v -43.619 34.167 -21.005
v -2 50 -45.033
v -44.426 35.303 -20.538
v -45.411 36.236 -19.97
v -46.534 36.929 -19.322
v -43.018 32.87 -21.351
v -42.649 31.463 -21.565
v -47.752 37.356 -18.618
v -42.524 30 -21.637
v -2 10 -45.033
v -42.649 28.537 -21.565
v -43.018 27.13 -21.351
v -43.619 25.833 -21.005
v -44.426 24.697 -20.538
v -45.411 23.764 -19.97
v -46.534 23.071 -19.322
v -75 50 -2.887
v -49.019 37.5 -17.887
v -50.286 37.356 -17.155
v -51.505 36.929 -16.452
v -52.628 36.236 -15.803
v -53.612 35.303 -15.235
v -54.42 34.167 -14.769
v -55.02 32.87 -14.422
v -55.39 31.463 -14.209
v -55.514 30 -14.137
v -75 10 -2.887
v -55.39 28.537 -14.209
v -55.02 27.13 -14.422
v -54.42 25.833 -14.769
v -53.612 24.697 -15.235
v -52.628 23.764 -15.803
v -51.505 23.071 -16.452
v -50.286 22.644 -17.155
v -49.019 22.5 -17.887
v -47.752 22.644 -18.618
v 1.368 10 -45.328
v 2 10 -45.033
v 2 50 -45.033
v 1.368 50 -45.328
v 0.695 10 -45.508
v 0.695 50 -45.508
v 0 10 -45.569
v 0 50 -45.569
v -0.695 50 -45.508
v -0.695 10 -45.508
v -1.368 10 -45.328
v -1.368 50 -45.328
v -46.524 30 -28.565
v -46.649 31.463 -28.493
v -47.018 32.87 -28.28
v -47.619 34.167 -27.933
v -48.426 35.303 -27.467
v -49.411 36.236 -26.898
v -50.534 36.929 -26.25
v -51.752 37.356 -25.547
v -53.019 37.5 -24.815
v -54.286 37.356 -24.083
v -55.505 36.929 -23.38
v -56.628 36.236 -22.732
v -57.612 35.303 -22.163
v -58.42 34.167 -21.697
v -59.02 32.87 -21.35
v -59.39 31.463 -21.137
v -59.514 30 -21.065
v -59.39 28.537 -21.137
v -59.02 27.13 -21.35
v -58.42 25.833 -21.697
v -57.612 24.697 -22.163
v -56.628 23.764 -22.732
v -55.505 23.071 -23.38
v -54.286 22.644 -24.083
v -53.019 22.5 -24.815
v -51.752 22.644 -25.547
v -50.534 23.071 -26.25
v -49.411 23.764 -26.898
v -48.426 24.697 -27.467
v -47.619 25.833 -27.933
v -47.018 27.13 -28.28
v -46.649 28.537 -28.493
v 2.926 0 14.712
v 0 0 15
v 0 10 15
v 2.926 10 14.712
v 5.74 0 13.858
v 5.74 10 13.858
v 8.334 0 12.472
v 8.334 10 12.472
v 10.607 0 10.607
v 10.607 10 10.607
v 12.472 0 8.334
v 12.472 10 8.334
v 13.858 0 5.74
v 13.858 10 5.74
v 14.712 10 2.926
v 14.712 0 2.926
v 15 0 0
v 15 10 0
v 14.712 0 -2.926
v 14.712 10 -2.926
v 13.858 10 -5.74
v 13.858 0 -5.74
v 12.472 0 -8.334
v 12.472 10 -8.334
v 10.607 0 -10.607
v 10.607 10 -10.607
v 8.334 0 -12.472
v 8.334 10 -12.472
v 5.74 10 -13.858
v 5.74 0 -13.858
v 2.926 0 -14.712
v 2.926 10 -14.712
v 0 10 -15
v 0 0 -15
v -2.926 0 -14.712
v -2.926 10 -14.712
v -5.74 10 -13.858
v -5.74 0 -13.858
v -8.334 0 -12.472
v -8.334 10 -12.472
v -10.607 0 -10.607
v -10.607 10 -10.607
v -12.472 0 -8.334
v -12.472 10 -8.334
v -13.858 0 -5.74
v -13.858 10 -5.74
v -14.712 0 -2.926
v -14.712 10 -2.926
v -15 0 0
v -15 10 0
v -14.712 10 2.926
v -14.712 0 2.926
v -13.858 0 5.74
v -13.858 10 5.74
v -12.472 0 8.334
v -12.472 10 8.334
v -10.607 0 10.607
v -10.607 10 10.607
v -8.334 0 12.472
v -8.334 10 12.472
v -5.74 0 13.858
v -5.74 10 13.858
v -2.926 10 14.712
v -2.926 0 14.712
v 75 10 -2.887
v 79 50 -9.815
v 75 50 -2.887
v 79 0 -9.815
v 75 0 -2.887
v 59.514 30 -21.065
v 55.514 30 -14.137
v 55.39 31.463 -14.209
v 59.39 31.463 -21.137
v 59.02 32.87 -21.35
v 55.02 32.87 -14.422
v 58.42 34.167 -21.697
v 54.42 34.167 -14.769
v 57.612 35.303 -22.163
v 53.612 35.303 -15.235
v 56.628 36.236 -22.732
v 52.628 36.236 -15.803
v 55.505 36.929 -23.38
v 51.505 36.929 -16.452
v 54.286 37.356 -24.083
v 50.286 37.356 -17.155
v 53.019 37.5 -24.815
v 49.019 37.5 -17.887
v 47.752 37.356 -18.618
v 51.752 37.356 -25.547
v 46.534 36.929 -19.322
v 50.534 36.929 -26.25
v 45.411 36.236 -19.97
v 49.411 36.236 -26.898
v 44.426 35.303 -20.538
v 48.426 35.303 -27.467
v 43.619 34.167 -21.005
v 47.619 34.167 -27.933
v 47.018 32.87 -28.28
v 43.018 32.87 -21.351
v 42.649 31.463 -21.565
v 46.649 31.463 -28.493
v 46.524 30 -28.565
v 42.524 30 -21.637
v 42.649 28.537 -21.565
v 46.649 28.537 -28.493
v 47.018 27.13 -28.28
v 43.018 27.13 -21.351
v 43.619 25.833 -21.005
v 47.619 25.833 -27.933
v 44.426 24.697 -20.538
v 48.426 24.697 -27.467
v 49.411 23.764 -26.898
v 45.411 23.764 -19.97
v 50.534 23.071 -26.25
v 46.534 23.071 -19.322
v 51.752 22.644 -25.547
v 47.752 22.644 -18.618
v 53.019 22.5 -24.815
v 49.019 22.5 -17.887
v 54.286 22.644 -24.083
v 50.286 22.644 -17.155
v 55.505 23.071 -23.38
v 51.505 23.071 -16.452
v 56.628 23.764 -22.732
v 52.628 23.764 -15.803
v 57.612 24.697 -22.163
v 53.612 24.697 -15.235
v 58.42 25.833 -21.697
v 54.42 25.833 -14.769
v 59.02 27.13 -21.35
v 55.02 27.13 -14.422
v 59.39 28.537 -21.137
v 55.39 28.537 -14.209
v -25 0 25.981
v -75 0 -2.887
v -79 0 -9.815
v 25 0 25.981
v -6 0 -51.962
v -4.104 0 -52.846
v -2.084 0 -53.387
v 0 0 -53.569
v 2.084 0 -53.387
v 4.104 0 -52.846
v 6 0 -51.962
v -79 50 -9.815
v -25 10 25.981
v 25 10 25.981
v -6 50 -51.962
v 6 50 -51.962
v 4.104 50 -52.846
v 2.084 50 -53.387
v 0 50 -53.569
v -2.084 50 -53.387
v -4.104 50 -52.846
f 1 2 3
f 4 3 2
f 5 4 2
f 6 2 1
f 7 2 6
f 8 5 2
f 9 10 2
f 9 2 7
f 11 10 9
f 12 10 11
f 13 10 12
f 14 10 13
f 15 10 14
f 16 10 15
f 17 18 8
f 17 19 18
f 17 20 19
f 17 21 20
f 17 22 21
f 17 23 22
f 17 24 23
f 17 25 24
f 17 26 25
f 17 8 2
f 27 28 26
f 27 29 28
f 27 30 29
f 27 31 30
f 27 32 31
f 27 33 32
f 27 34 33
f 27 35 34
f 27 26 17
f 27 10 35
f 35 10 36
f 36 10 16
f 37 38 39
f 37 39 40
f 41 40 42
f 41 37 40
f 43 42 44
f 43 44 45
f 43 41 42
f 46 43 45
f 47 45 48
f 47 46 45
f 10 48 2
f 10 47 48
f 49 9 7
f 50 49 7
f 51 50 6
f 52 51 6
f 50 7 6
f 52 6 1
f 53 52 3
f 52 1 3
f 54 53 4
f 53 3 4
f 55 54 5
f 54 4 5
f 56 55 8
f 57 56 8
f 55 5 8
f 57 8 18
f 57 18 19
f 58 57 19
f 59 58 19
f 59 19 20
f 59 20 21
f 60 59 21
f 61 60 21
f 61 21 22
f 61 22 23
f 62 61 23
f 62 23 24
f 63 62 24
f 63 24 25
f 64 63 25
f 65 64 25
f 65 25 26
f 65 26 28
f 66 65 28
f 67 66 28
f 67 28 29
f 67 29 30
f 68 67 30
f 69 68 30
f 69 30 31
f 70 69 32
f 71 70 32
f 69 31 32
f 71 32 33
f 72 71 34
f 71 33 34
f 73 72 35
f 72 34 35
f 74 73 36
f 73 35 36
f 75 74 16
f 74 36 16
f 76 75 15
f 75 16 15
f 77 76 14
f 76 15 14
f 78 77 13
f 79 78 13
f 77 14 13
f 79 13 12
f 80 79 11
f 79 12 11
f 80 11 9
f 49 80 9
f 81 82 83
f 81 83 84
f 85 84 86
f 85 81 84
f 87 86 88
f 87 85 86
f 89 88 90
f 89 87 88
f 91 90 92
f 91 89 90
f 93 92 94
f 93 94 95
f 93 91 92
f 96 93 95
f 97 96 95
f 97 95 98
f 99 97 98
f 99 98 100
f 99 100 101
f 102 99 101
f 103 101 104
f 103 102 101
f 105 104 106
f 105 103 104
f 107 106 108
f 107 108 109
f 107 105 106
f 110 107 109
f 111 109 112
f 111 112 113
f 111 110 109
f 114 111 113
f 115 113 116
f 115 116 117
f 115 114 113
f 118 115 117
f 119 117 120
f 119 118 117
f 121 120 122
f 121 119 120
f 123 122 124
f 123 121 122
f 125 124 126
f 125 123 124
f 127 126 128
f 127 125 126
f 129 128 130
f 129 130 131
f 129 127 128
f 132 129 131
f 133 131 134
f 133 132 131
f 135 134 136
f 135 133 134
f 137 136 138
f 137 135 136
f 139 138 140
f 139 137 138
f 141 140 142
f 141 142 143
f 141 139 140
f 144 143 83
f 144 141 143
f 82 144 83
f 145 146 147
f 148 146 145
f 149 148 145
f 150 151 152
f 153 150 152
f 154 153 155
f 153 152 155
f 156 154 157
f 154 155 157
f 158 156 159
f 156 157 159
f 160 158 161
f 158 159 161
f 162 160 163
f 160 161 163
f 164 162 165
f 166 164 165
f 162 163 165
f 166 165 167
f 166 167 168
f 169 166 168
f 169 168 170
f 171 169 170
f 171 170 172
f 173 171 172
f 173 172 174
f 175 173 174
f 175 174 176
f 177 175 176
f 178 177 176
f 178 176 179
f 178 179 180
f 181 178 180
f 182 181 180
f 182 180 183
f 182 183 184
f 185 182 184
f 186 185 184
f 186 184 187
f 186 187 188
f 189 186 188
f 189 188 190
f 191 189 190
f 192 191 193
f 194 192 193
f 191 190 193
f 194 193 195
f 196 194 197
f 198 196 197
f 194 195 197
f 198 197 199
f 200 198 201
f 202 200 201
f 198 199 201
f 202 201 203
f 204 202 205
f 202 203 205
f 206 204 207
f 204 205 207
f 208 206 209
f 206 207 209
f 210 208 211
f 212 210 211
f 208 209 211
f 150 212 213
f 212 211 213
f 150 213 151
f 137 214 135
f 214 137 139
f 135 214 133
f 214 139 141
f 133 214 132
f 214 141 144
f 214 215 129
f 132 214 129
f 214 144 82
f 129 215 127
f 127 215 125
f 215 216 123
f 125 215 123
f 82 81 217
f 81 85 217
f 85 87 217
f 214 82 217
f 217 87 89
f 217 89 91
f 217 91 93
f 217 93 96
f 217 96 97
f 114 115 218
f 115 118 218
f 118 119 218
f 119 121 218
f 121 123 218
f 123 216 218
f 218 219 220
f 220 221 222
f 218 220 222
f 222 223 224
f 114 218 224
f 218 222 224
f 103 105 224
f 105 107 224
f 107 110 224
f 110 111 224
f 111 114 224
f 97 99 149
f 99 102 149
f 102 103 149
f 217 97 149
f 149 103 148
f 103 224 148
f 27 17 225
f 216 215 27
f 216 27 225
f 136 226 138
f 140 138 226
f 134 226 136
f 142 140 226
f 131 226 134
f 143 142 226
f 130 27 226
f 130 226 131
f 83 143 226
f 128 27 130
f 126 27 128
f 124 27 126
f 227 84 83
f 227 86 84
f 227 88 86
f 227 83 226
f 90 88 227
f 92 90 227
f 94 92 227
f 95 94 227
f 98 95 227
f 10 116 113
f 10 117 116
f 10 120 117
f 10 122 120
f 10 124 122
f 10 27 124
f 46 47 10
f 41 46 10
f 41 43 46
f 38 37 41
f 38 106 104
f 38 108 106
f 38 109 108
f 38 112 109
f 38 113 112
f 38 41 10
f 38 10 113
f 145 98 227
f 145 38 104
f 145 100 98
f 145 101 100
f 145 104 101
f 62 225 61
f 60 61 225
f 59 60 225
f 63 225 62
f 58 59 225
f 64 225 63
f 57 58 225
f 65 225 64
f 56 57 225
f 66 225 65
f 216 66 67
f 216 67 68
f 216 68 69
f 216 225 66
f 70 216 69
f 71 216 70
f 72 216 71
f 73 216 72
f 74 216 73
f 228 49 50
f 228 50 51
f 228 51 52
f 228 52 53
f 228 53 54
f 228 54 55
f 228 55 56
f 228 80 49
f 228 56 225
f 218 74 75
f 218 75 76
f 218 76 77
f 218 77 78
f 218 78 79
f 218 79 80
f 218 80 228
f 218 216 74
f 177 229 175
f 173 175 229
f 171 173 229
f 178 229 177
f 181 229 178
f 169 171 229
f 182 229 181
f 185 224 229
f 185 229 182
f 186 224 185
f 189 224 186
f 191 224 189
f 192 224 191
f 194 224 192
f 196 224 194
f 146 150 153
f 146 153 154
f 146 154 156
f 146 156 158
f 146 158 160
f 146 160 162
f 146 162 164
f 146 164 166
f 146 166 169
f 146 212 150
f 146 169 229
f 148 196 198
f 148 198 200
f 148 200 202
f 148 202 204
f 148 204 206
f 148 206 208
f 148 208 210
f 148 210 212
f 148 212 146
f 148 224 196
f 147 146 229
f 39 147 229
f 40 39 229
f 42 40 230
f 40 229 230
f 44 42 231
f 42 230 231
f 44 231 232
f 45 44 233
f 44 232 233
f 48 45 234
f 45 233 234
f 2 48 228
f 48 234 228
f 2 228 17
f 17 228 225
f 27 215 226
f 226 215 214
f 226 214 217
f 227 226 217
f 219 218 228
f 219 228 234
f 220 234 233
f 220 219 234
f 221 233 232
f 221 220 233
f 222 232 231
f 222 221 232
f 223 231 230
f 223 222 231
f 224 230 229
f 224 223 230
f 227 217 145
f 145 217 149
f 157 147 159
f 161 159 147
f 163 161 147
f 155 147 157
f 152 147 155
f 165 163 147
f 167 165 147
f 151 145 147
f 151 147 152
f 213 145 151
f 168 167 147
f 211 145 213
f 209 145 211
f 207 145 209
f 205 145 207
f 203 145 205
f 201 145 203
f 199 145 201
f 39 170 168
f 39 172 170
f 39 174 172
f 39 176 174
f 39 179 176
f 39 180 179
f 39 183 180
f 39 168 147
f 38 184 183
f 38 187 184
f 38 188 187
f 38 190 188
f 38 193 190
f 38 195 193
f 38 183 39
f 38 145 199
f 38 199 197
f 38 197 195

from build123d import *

# Parameters (mm, degrees)
RESSALTO_EXTRUS_O4_DEPTH = 50
ESBO_O1_7_R              = 15
RESSALTO_EXTRUS_O5_DEPTH = 10
CORTE_EXTRUS_O1_REACH    = 128.396
ESBO_O2_R                = 7.5
CORTE_EXTRUS_O2_REACH    = 128.396
ESBO_O3_R                = 7.5


with BuildPart() as part:
    # Esboço1 → Ressalto-extrusão4 (new body)
    with BuildSketch(Plane(origin=(0, 0, 0), x_dir=(1, 0, 0), z_dir=(0, 1, 0))):
        with BuildLine():
            Line((-75, 2.886751346), (-2, 45.033320997))
            ThreePointArc((-2, 45.033320997), (0, 45.569219382), (2, 45.033320997))
            Line((2, 45.033320997), (75, 2.886751346))
            Line((75, 2.886751346), (79, 9.814954576))
            Line((79, 9.814954576), (6, 51.961524227))
            ThreePointArc((6, 51.961524227), (0, 53.569219382), (-6, 51.961524227))
            Line((-6, 51.961524227), (-79, 9.814954576))
            Line((-79, 9.814954576), (-75, 2.886751346))
        make_face()
    extrude(amount=RESSALTO_EXTRUS_O4_DEPTH)

    # Esboço1<7> → Ressalto-extrusão5 (add)
    with BuildSketch(Plane(origin=(0, 0, 0), x_dir=(1, 0, 0), z_dir=(0, 1, 0))):
        with BuildLine():
            ThreePointArc((2, 45.033320997), (0, 45.569219382), (-2, 45.033320997))
            Line((-2, 45.033320997), (-75, 2.886751346))
            Line((-75, 2.886751346), (-25, -25.980762114))
            Line((-25, -25.980762114), (25, -25.980762114))
            Line((25, -25.980762114), (75, 2.886751346))
            Line((75, 2.886751346), (2, 45.033320997))
        make_face()
        Circle(ESBO_O1_7_R, mode=Mode.SUBTRACT)
    extrude(amount=RESSALTO_EXTRUS_O5_DEPTH)

    # Esboço2 → Corte-extrusão1 (cut, up to next)
    with BuildSketch(Plane(origin=(-20, 0, -34.641016151), x_dir=(0.866025403784438, 0, -0.5000000000000012), z_dir=(0.5000000000000011, 0, 0.8660254037844379)), mode=Mode.PRIVATE) as corte_extrus_o1_sk1:
        with Locations((-33.508529611, 30)):
            Circle(ESBO_O2_R)
    corte_extrus_o1_tool1 = extrude(corte_extrus_o1_sk1.sketch, amount=-CORTE_EXTRUS_O1_REACH, mode=Mode.PRIVATE) & part.part
    add(corte_extrus_o1_tool1.solids().sort_by_distance((-49.019238, 30, -17.886751))[0], mode=Mode.SUBTRACT)

    # Esboço3 → Corte-extrusão2 (cut, up to next)
    with BuildSketch(Plane(origin=(20, 0, -34.641016151), x_dir=(0.866025403784438, 0, 0.5000000000000012), z_dir=(-0.5000000000000011, 0, 0.8660254037844379)), mode=Mode.PRIVATE) as corte_extrus_o2_sk1:
        with Locations((33.508529611, 30)):
            Circle(ESBO_O3_R)
    corte_extrus_o2_tool1 = extrude(corte_extrus_o2_sk1.sketch, amount=-CORTE_EXTRUS_O2_REACH, mode=Mode.PRIVATE) & part.part
    add(corte_extrus_o2_tool1.solids().sort_by_distance((49.019238, 30, -17.886751))[0], mode=Mode.SUBTRACT)


solid = part.part
